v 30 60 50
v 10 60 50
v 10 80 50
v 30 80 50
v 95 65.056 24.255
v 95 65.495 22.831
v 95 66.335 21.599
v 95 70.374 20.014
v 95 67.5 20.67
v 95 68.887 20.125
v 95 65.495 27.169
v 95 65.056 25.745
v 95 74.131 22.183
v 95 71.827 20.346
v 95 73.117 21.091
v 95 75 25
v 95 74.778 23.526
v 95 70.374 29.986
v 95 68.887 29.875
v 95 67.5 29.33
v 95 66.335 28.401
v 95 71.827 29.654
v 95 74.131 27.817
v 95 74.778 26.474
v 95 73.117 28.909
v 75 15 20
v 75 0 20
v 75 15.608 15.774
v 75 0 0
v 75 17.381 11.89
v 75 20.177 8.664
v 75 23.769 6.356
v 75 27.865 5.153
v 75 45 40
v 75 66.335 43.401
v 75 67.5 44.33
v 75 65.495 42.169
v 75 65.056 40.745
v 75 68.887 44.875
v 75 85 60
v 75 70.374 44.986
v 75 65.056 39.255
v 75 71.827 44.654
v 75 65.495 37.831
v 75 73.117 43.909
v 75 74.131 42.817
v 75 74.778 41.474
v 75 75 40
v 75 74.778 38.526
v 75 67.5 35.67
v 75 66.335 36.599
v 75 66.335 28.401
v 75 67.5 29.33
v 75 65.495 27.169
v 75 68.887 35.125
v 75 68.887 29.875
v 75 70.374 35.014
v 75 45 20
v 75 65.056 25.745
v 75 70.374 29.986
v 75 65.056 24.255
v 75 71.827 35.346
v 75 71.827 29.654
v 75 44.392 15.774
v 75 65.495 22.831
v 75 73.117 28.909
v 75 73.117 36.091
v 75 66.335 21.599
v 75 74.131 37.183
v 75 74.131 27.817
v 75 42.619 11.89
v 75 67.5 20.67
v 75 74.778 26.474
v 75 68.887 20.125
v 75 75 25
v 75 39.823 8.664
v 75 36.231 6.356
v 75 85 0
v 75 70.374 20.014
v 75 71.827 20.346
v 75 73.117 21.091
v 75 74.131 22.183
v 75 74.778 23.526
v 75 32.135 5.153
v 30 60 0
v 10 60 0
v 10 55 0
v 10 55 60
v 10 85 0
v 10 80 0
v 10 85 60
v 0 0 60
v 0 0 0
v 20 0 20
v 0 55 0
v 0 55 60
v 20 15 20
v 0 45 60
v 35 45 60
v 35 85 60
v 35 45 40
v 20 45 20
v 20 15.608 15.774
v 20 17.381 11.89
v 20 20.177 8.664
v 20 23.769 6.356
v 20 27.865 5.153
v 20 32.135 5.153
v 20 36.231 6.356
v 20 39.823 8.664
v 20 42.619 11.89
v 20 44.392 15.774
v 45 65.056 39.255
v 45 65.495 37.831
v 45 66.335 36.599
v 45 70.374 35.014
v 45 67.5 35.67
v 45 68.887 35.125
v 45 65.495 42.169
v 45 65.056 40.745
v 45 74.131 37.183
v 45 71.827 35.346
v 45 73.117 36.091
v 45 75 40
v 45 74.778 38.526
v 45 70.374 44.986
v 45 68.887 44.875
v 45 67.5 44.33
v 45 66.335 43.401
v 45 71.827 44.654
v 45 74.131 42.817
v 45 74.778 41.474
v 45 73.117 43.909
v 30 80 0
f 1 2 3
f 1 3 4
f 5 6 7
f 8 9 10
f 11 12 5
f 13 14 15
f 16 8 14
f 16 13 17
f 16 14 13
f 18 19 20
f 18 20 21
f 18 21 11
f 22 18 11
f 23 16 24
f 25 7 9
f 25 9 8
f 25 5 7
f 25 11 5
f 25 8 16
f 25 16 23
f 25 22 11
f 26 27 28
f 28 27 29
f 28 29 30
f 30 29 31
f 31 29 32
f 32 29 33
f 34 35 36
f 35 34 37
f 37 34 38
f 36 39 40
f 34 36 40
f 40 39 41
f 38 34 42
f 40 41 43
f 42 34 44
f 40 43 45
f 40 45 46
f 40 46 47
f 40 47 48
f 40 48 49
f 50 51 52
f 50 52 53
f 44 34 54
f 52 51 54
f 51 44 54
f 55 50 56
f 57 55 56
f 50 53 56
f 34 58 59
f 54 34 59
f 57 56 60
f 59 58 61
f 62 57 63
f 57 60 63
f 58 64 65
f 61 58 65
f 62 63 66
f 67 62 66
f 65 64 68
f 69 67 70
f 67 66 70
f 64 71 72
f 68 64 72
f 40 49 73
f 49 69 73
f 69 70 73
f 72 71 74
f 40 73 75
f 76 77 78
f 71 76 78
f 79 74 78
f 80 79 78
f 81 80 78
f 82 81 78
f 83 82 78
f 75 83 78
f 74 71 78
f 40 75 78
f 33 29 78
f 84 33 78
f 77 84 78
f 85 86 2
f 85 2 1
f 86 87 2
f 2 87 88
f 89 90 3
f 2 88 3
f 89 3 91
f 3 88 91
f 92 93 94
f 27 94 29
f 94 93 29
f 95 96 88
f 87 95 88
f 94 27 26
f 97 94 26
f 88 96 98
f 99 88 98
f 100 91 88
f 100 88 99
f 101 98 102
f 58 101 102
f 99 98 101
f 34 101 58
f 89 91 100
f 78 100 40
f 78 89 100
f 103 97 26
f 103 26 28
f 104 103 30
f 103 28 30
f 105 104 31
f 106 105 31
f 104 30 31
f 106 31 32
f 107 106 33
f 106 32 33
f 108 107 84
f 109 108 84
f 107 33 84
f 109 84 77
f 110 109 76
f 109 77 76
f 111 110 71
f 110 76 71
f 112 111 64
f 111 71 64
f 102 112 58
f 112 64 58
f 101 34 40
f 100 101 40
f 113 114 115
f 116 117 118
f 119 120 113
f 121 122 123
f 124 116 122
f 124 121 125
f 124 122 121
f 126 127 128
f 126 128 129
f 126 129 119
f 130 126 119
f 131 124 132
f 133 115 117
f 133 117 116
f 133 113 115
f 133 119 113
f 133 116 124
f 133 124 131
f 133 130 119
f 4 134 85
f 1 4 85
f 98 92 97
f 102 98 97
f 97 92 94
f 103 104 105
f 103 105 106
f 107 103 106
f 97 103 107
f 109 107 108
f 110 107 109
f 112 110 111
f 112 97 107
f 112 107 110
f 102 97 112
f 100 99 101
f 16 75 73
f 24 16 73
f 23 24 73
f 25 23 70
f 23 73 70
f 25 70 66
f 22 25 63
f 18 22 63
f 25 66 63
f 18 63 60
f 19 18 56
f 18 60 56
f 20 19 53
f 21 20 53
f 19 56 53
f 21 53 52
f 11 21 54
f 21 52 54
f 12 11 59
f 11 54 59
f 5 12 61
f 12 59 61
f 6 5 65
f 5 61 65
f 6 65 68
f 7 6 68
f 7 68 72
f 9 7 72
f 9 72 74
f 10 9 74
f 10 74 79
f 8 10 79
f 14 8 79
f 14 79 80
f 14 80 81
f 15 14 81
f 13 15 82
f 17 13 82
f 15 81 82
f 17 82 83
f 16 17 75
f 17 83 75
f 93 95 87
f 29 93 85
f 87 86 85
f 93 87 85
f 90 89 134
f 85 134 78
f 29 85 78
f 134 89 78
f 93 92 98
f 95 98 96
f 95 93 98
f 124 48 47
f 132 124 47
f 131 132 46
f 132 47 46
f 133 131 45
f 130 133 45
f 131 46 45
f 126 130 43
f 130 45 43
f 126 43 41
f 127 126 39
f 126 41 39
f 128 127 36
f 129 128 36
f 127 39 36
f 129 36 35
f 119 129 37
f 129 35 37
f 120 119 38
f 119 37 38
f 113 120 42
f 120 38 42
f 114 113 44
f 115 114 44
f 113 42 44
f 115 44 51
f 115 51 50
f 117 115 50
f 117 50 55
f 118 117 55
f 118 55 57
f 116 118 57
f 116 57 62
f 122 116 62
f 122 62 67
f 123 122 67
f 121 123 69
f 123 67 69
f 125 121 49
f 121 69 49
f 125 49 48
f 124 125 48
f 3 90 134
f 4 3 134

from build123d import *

# Parameters (mm, degrees)
F0_W      = 75
F0_H      = 85
F1_DEPTH  = 60
F2_R      = 5
F3_DEPTH  = 20
F4_R      = 5
F5_DEPTH  = 30
F6_W      = 10
F6_H      = 30
F7_DEPTH  = 60.001
F9_DEPTH  = 45
F11_DEPTH = 40
F12_W     = 45
F12_H     = 40
F13_DEPTH = 55
F14_R     = 15
F15_DEPTH = 55
F16_W     = 20
F16_H     = 20
F17_DEPTH = 50


with BuildPart() as f1:
    # F0 (on Top) → F1 (new body)
    with BuildSketch(Plane.XY):
        with Locations((37.5, 42.5)):
            Rectangle(F0_W, F0_H)
    extrude(amount=F1_DEPTH)

    # F2 (on face) → F3 (join)
    with BuildSketch(Plane.YZ.offset(75)):
        with Locations((70, 25)):
            Circle(F2_R)
    extrude(amount=F3_DEPTH)

    # F4 (on face) → F5 (cut)
    with BuildSketch(Plane.YZ.offset(75)):
        with Locations((70, 40)):
            Circle(F4_R)
    extrude(amount=-F5_DEPTH, mode=Mode.SUBTRACT)

    # F6 (on face) → F7 (cut, through all)
    with BuildSketch(Plane.XY.offset(60)):
        with Locations((5, 70)):
            Rectangle(F6_W, F6_H)
    extrude(amount=-F7_DEPTH, mode=Mode.SUBTRACT)

    # F8 (on face) → F9 (cut)
    with BuildSketch(Plane.XZ):
        Polygon((20, 60), (0, 60), (20, 20), align=None)
    extrude(amount=-F9_DEPTH, mode=Mode.SUBTRACT)

    # F10 (on face) → F11 (cut)
    with BuildSketch(Plane.YZ.offset(75)):
        Polygon((45, 40), (85, 60), (45, 60), align=None)
    extrude(amount=-F11_DEPTH, mode=Mode.SUBTRACT)

    # F12 (on face) → F13 (cut)
    with BuildSketch(Plane.YZ.offset(75)):
        with Locations((22.5, 40)):
            Rectangle(F12_W, F12_H)
    extrude(amount=-F13_DEPTH, mode=Mode.SUBTRACT)

    # F14 (on face) → F15 (cut, through all)
    with BuildSketch(Plane.YZ.offset(75)):
        with Locations((30, 20)):
            Circle(F14_R)
    extrude(amount=-F15_DEPTH, mode=Mode.SUBTRACT)

    # F16 (on face) → F17 (cut)
    with BuildSketch(Plane(origin=(0, 0, 0), x_dir=(1, 0, 0), z_dir=(0, 0, -1))):
        with Locations((20, -70)):
            Rectangle(F16_W, F16_H)
    extrude(amount=-F17_DEPTH, mode=Mode.SUBTRACT)


solid = f1.part
